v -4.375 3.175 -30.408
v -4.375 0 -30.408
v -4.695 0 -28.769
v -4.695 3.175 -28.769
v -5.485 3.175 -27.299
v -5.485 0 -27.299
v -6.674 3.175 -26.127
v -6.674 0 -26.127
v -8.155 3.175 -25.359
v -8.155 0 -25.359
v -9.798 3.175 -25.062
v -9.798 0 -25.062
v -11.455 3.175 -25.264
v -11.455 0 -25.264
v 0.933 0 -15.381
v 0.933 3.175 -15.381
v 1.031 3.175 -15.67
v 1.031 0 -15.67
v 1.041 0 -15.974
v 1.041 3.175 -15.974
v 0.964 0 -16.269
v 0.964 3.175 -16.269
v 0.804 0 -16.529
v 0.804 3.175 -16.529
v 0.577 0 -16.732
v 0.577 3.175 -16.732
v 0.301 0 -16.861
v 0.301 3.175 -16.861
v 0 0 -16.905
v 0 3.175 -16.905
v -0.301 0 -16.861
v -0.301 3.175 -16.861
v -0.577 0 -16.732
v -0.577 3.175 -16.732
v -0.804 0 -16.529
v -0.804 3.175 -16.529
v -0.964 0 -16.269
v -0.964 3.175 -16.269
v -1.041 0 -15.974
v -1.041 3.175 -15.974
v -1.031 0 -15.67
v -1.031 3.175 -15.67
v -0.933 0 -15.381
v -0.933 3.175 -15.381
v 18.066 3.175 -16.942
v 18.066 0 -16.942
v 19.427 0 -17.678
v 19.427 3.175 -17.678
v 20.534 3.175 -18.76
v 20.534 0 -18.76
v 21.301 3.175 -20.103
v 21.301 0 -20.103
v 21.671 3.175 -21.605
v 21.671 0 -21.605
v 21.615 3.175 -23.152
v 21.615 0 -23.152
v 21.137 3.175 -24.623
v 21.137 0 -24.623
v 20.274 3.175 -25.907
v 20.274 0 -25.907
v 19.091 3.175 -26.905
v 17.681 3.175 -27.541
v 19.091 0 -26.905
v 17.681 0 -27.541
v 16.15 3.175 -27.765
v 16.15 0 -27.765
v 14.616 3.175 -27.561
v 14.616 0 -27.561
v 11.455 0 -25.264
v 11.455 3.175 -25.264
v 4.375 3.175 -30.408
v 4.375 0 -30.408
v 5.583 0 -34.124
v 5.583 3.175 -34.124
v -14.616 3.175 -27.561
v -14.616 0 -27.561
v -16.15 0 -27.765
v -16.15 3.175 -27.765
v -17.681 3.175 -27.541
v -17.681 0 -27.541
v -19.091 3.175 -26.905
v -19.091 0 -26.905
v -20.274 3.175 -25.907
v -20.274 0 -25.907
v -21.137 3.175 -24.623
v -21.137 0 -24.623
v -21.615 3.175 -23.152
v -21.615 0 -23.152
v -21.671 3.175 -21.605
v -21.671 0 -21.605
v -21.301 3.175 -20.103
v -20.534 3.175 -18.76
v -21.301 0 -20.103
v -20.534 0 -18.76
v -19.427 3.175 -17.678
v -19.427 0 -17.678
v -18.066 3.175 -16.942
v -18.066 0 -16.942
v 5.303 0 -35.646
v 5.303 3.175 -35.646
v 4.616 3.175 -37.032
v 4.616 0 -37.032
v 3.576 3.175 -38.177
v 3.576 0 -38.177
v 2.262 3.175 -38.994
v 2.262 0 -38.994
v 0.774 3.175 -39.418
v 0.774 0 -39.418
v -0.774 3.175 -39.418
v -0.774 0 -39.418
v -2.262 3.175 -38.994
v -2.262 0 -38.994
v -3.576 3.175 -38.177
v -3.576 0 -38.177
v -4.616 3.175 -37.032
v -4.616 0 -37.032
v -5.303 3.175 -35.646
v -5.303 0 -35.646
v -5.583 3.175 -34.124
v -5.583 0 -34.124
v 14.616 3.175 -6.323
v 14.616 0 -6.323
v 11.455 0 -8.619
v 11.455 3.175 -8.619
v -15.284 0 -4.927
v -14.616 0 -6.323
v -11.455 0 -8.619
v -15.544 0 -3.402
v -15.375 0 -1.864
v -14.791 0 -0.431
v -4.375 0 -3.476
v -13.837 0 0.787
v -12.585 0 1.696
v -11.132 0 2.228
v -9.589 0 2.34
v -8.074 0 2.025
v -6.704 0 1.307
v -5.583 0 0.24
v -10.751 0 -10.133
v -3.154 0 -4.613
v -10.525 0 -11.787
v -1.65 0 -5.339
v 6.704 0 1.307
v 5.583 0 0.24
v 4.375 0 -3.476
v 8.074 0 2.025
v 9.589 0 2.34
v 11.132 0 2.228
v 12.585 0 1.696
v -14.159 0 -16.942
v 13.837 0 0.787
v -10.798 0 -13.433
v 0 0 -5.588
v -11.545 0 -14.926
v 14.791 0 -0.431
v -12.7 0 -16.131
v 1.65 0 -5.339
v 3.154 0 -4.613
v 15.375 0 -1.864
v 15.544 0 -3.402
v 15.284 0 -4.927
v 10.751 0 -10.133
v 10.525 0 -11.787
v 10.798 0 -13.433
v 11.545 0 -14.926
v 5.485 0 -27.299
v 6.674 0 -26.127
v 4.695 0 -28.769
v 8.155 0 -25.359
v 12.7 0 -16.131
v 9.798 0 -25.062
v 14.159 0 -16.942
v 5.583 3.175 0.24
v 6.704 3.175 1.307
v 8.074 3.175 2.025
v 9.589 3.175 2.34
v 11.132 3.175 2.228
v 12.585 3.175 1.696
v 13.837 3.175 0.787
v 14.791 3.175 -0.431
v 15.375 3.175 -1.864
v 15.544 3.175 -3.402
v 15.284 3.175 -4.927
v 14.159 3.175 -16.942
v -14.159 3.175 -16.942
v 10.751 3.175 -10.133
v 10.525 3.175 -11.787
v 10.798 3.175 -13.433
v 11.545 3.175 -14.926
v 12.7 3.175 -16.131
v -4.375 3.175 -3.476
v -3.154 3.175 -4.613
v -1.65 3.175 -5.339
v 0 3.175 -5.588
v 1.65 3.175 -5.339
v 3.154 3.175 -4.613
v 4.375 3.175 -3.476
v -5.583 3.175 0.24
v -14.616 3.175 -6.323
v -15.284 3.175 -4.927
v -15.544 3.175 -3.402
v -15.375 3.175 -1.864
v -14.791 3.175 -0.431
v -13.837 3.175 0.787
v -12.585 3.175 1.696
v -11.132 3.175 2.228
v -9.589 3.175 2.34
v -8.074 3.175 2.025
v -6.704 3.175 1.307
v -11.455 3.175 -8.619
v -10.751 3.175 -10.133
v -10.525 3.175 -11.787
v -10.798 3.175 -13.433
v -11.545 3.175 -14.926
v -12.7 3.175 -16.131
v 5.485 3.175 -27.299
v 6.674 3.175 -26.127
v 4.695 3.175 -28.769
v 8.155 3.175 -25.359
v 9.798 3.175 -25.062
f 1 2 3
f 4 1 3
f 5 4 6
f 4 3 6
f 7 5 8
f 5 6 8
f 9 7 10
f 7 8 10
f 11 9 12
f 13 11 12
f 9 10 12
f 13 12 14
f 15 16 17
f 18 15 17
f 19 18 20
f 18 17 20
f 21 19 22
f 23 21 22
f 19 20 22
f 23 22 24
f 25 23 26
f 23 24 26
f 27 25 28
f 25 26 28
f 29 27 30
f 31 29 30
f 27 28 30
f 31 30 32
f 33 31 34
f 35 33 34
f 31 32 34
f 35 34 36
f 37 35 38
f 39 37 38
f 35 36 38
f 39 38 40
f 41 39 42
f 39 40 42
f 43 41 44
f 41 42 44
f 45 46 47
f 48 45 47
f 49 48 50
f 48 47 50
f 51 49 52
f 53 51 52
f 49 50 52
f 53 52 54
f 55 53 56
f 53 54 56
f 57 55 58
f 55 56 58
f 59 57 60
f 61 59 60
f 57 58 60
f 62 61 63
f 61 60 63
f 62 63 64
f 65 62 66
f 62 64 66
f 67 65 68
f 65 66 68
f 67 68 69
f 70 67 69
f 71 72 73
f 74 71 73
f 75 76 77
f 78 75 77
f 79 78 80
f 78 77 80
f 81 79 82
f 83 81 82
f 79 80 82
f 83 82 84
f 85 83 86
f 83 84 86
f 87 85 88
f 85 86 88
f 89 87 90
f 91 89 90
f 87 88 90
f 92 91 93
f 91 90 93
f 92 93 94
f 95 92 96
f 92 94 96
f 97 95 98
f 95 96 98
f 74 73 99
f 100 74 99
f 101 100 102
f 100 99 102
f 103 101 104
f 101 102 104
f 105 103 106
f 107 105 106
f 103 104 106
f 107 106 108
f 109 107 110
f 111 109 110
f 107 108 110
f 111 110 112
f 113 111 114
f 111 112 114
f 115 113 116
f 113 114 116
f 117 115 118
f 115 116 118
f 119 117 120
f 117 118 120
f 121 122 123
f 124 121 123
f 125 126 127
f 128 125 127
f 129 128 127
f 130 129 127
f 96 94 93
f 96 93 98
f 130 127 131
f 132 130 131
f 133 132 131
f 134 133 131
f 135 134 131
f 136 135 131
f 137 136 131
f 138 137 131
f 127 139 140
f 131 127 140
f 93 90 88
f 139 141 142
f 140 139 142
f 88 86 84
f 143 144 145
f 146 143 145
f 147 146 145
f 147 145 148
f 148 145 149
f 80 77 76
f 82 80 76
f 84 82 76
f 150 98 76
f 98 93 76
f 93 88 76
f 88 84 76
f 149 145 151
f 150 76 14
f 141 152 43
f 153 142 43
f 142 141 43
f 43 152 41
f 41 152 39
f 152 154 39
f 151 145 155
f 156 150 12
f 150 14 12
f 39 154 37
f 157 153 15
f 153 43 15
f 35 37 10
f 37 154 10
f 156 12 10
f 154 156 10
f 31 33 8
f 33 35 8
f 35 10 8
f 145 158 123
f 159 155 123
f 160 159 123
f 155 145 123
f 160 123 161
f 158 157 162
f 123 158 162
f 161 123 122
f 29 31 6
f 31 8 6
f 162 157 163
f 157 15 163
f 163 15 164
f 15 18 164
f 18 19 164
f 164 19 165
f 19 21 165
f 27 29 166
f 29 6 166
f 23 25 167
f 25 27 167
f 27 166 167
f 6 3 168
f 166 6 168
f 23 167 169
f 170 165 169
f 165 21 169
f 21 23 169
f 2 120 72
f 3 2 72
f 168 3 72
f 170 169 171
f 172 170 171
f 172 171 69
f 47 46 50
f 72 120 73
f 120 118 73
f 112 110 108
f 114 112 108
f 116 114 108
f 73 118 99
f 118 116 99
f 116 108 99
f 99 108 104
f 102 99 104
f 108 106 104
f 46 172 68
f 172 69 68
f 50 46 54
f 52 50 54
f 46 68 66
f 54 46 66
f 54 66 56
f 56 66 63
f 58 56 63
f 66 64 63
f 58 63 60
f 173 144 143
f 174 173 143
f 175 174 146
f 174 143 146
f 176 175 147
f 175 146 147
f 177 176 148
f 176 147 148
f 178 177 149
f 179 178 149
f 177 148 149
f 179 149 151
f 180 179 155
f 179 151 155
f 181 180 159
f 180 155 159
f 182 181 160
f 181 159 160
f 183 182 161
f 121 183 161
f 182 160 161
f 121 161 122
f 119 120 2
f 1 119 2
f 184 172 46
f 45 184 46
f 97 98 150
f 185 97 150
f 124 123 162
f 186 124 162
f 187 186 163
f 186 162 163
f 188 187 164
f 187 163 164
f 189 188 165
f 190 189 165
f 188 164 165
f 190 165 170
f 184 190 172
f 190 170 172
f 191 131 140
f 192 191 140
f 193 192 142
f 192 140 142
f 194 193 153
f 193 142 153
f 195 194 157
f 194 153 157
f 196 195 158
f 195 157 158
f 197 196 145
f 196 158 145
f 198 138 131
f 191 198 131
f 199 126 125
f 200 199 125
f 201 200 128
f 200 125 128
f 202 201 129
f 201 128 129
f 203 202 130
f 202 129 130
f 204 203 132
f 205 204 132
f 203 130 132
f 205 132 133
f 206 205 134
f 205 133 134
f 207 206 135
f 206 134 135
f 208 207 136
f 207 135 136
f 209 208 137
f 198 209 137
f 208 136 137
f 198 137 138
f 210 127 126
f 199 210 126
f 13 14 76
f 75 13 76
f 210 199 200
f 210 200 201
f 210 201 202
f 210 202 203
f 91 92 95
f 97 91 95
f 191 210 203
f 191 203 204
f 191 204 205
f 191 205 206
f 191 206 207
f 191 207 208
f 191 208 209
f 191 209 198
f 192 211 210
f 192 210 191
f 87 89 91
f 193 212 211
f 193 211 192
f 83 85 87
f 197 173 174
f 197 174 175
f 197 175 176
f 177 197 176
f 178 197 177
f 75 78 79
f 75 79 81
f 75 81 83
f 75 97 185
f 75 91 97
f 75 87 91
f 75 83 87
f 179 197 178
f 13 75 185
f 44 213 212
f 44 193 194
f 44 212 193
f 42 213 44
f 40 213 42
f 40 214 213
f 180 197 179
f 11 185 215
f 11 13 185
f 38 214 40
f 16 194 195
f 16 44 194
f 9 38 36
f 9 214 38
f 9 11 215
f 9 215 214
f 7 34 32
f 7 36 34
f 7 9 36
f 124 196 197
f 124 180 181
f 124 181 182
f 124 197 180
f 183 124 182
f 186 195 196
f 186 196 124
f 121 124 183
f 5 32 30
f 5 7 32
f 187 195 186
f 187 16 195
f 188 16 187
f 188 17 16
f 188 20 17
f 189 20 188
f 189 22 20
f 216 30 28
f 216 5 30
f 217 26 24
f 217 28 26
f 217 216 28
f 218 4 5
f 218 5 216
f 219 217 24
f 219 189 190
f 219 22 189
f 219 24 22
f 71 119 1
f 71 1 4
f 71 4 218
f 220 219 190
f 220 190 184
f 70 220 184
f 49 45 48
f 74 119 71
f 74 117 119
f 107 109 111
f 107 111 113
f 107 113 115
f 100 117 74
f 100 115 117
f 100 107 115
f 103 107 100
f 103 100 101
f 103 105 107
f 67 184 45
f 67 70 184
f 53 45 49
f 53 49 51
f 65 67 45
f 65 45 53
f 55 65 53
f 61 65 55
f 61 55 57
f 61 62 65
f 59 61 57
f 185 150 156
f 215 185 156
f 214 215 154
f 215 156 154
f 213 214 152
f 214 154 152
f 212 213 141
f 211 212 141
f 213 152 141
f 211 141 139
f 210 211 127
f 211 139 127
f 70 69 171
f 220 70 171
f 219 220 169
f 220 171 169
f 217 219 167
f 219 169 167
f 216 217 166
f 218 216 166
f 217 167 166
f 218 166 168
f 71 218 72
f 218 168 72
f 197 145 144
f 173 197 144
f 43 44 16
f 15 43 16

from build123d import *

# Parameters (mm, degrees)
BOSS_EXTRUDE1_DEPTH = 3.175
CUT_EXTRUDE1_DEPTH  = 46.155334956


with BuildPart() as part:
    # Sketch2 → Boss-Extrude1 (new body)
    with BuildSketch(Plane(origin=(0, 0, 0), x_dir=(1, 0, 0), z_dir=(0, 1, 0))):
        with BuildLine():
            Line((-5.582827527, 34.123976372), (-4.37531266, 30.407627744))
            ThreePointArc((-4.37531266, 30.407627744), (-6.673596197, 26.127217151), (-11.454717255, 25.264139232))
            Line((-11.454717255, 25.264139232), (-14.61603222, 27.560968998))
            ThreePointArc((-14.61603222, 27.560968998), (-21.427113101, 23.90389108), (-18.066409385, 16.9418))
            Line((-18.066409385, 16.9418), (-14.15880919, 16.9418))
            ThreePointArc((-14.15880919, 16.9418), (-10.798105475, 13.433282849), (-11.454717255, 8.619460768))
            Line((-11.454717255, 8.619460768), (-14.61603222, 6.322631002))
            ThreePointArc((-14.61603222, 6.322631002), (-13.242684177, -1.28519108), (-5.582827527, -0.240376372))
            Line((-5.582827527, -0.240376372), (-4.37531266, 3.475972256))
            ThreePointArc((-4.37531266, 3.475972256), (0, 5.588), (4.37531266, 3.475972256))
            Line((4.37531266, 3.475972256), (5.582827527, -0.240376372))
            ThreePointArc((5.582827527, -0.240376372), (13.242684177, -1.28519108), (14.61603222, 6.322631002))
            Line((14.61603222, 6.322631002), (11.454717255, 8.619460768))
            ThreePointArc((11.454717255, 8.619460768), (10.798105475, 13.433282849), (14.15880919, 16.9418))
            Line((14.15880919, 16.9418), (18.066409385, 16.9418))
            ThreePointArc((18.066409385, 16.9418), (21.427113101, 23.90389108), (14.61603222, 27.560968998))
            Line((14.61603222, 27.560968998), (11.454717255, 25.264139232))
            ThreePointArc((11.454717255, 25.264139232), (6.673596197, 26.127217151), (4.37531266, 30.407627744))
            Line((4.37531266, 30.407627744), (5.582827527, 34.123976372))
            ThreePointArc((5.582827527, 34.123976372), (0, 39.4716), (-5.582827527, 34.123976372))
        make_face()
    extrude(amount=BOSS_EXTRUDE1_DEPTH)

    # Sketch3 → Cut-Extrude1 (cut, through all)
    with BuildSketch(Plane(origin=(0, 3.175, 0), x_dir=(1, 0, 0), z_dir=(0, 1, 0))):
        with BuildLine():
            Line((-0.933255592, 15.381358575), (0.933255592, 15.381358575))
            ThreePointArc((0.933255592, 15.381358575), (0, 16.905358575), (-0.933255592, 15.381358575))
        make_face()
    extrude(amount=-CUT_EXTRUDE1_DEPTH, mode=Mode.SUBTRACT)


solid = part.part
